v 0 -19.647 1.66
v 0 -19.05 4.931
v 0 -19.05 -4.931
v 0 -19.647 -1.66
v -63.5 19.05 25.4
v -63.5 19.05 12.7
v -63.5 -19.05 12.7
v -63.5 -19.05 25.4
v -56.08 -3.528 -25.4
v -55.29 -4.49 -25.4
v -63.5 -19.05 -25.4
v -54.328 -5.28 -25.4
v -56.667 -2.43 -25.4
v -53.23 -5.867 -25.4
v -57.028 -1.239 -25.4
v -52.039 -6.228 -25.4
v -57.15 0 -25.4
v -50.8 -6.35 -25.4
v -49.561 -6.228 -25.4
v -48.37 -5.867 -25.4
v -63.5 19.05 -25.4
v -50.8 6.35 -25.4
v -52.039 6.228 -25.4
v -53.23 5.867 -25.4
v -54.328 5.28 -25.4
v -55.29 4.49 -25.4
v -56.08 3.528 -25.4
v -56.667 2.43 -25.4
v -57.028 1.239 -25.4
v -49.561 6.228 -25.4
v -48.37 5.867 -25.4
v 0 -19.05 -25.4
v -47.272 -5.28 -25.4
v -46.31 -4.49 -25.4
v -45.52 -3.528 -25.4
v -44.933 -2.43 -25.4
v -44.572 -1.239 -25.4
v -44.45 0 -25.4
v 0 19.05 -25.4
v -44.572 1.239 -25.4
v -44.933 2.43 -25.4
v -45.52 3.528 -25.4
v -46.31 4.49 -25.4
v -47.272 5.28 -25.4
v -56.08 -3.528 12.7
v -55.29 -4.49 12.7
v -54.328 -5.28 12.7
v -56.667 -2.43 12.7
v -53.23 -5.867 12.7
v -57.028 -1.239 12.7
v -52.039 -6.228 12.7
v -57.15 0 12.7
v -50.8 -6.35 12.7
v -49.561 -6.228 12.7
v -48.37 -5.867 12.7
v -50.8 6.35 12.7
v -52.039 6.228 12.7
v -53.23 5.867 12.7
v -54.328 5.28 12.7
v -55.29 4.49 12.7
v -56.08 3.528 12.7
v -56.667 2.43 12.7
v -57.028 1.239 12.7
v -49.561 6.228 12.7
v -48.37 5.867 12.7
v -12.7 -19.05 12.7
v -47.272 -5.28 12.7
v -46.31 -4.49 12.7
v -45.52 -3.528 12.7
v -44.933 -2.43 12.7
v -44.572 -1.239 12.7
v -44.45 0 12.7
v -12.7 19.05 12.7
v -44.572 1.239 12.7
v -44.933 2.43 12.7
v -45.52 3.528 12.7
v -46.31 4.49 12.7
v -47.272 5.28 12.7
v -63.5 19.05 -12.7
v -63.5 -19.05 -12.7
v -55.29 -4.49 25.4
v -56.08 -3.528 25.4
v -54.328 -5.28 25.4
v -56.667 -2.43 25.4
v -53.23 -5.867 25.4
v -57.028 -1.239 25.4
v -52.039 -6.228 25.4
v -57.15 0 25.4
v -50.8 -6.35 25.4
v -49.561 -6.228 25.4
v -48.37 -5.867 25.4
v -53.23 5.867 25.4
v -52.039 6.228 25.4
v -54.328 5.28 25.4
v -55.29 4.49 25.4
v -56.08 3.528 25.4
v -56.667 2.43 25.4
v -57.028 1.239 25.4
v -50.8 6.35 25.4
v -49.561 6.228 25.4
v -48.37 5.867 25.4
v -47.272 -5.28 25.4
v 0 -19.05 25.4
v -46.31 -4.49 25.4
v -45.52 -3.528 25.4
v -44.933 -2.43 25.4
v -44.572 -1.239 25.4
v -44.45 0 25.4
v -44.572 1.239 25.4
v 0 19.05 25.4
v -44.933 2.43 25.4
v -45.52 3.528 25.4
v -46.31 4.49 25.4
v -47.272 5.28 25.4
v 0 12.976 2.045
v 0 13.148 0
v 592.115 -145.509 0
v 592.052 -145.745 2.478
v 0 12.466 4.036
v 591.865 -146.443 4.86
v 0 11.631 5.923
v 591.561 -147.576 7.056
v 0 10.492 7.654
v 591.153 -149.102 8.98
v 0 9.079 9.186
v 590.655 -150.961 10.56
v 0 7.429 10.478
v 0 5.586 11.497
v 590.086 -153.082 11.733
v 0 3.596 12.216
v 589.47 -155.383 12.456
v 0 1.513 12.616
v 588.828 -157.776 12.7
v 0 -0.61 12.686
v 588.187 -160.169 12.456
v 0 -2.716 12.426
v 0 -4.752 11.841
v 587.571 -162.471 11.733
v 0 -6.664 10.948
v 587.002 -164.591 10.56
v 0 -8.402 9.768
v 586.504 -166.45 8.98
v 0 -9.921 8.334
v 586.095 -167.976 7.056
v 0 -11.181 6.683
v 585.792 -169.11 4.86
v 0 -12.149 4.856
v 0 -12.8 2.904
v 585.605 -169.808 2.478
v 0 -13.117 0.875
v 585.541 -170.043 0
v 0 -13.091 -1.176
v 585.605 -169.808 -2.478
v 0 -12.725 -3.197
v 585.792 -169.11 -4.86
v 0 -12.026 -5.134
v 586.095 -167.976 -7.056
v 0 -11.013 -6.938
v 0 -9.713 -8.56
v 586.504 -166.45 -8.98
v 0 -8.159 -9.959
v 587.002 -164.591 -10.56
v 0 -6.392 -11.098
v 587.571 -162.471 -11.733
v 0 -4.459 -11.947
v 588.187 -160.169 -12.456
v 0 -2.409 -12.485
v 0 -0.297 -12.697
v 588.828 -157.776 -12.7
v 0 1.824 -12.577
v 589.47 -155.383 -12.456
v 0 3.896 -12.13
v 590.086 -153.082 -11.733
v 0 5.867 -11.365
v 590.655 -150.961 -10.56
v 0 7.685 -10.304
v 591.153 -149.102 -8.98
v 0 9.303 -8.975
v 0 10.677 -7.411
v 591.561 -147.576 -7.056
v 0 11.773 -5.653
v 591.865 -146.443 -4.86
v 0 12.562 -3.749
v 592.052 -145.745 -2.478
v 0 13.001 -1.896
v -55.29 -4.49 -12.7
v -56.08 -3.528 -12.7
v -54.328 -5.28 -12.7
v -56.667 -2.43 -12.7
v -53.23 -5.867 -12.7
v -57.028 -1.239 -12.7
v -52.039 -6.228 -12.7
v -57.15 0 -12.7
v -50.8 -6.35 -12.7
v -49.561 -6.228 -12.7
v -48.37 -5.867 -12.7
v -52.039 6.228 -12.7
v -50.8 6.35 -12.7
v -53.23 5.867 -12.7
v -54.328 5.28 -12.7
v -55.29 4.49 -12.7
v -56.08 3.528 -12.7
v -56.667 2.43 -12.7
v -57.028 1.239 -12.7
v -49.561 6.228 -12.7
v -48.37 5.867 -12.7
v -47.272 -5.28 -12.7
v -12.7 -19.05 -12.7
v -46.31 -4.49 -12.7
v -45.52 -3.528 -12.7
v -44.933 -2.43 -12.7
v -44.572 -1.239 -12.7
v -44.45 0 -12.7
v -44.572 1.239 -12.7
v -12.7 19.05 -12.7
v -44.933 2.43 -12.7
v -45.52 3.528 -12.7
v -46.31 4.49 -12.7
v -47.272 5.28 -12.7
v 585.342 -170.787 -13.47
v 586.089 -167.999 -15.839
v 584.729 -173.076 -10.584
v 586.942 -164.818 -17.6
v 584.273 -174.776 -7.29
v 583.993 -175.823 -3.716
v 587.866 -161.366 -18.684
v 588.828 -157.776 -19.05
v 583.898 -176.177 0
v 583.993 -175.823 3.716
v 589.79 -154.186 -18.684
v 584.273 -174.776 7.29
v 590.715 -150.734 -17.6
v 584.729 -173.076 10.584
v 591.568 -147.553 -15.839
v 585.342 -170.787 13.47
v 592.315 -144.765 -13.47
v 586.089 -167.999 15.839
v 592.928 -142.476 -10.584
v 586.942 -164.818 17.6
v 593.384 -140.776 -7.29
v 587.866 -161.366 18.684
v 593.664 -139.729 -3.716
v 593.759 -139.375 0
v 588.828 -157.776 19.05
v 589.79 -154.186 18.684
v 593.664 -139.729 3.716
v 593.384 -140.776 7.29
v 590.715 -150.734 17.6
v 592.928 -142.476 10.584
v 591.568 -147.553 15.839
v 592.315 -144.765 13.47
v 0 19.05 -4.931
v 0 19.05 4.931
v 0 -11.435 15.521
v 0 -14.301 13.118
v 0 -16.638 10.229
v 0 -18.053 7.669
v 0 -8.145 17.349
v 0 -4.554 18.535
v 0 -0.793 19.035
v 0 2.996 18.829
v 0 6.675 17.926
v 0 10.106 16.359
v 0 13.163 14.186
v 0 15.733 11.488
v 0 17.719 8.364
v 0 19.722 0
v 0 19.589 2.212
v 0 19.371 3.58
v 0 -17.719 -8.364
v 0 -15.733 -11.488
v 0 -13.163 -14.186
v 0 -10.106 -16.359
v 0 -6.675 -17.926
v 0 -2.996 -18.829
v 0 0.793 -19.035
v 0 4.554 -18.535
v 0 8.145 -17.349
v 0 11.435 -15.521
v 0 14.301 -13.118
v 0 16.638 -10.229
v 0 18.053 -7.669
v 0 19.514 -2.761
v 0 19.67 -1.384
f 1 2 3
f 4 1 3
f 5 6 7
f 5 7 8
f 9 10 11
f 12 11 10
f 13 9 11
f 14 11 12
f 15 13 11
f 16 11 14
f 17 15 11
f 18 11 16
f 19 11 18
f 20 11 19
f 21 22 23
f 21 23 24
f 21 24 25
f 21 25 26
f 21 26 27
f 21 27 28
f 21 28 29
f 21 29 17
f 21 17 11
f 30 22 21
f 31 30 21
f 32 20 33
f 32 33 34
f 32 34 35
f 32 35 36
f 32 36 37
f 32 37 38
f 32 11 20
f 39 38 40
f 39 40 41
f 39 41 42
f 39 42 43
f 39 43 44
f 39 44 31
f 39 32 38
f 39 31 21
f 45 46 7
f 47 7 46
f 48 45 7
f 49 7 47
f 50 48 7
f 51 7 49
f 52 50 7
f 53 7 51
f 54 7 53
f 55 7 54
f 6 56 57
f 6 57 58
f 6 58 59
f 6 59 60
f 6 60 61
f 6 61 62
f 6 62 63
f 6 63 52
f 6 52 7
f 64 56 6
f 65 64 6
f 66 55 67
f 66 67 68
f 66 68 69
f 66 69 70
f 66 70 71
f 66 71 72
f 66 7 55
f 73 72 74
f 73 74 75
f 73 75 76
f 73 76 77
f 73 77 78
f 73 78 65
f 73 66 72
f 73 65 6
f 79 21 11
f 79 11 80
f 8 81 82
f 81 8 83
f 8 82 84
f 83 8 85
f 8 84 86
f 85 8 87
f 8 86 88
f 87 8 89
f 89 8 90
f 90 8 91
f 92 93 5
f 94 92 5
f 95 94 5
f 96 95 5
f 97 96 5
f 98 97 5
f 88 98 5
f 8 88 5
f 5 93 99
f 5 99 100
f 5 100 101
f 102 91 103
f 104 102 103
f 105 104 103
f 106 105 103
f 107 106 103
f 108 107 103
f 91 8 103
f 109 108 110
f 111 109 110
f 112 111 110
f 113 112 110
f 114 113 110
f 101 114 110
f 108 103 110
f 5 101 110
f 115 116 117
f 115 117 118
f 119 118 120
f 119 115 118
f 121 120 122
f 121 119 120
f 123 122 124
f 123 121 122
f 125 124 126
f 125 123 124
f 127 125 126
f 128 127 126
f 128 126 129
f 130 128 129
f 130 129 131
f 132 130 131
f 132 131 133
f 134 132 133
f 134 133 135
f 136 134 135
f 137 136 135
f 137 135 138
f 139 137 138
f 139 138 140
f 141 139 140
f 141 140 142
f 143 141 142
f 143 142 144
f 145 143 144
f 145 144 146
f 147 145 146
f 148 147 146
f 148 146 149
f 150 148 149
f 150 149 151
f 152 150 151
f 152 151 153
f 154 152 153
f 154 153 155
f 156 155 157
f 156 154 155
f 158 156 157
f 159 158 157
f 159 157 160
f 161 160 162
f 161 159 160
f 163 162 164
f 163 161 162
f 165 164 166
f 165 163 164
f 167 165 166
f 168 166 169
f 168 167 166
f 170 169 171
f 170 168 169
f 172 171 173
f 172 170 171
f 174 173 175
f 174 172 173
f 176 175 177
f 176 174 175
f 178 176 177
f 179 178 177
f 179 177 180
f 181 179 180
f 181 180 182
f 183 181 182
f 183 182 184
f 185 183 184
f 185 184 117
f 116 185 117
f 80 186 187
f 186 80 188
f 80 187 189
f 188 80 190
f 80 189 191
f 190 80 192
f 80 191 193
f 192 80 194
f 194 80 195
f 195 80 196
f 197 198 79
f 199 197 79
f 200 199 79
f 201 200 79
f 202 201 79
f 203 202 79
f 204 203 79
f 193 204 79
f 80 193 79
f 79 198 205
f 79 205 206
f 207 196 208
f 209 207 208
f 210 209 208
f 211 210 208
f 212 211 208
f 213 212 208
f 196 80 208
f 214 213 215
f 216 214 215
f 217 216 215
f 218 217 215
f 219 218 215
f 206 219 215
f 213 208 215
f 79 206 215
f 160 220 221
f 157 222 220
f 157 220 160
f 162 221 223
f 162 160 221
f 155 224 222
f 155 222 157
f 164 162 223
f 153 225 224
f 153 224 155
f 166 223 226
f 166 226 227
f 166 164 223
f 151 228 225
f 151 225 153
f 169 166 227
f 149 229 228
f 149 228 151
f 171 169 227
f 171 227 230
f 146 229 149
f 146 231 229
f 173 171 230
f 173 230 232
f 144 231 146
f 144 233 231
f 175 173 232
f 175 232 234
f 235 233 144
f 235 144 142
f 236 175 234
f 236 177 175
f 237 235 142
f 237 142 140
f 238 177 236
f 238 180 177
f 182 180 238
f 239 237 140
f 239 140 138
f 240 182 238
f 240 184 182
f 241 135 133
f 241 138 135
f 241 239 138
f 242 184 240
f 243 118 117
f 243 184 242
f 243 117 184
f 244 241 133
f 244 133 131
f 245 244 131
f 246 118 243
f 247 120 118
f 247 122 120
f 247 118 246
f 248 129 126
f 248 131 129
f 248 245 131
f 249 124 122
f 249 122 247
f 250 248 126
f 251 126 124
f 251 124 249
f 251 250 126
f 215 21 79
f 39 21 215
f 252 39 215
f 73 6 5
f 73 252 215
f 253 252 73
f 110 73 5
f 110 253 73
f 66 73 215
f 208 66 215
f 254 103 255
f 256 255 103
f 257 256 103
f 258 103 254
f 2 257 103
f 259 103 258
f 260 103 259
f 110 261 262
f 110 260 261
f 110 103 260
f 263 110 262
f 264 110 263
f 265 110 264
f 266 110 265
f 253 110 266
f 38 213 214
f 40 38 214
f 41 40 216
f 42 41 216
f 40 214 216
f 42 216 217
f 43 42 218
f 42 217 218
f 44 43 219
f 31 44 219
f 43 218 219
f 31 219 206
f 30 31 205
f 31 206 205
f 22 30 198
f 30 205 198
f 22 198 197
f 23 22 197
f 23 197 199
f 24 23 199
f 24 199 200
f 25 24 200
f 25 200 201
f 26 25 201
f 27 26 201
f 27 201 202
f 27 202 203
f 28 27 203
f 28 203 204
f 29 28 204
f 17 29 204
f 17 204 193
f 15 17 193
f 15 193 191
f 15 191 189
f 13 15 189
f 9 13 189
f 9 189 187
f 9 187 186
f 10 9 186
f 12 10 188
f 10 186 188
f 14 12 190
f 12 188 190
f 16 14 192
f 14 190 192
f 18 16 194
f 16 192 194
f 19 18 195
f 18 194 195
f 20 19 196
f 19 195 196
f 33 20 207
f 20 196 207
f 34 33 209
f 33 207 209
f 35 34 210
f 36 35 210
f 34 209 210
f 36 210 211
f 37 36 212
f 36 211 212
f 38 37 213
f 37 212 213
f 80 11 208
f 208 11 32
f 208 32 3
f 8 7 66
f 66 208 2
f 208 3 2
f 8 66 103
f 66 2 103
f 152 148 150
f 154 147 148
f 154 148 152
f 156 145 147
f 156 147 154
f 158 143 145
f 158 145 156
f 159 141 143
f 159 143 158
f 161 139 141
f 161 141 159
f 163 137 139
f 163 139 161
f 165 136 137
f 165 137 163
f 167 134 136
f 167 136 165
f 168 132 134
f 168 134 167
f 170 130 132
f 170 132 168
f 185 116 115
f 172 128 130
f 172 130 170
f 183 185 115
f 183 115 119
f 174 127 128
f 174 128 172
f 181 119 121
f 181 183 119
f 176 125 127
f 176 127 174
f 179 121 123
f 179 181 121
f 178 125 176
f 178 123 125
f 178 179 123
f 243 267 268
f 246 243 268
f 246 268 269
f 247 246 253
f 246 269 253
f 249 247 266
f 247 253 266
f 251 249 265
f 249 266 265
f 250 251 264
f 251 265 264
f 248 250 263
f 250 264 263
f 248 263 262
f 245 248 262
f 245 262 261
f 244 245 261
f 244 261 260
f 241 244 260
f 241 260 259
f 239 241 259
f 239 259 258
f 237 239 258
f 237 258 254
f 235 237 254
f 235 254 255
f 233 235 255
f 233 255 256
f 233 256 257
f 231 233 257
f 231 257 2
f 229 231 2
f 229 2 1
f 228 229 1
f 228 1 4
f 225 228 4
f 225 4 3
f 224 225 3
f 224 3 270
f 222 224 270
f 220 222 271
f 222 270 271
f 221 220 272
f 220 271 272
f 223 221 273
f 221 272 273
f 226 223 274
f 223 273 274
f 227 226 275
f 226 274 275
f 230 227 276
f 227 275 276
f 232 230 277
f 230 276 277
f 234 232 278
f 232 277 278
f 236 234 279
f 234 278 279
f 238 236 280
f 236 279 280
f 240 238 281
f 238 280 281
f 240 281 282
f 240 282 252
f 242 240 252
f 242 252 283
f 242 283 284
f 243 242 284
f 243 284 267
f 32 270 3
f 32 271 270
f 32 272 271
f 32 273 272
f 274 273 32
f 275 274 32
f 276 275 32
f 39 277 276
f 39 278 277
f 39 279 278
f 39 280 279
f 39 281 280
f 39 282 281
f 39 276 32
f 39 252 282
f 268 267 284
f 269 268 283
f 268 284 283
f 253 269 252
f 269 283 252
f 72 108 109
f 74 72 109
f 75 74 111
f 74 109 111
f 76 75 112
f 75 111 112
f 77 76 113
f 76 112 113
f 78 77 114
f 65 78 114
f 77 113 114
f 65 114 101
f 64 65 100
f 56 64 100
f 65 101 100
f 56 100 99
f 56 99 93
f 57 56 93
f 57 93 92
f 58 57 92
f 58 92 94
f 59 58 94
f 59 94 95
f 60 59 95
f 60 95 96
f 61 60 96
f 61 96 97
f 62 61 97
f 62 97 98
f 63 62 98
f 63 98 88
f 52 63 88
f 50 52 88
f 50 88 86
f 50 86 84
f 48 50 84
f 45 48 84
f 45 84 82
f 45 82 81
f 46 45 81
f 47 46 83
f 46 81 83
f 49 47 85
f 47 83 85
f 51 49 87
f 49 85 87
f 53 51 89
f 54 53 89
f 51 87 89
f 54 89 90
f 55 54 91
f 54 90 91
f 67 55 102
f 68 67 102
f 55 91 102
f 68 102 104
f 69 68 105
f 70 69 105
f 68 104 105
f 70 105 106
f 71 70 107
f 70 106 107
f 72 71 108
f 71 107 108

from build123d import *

# Parameters (mm, degrees)
SWEEP1_START         = -25.4
SWEEP1_OUTLINE_R     = 19.05
SWEEP1_DEPTH         = 635
CUT_SWEEP1_START     = -25.4
CUT_SWEEP1_OUTLINE_R = 12.7
CUT_SWEEP1_DEPTH     = 635
SKETCH25_R           = 57.15
CUT_EXTRUDE1_DEPTH   = 620.637672354
SKETCH26_W           = 50.8
SKETCH26_H           = 38.1
BOSS_EXTRUDE1_DEPTH  = 12.7
SKETCH27_W           = 12.7
SKETCH27_H           = 38.1
BOSS_EXTRUDE2_DEPTH  = 50.8
SKETCH28_R           = 6.35
CUT_EXTRUDE2_DEPTH   = 622.424639437


# Read off the part's stored shape, not the designer's step: Sweep1, Cut-Sweep1
with BuildPart() as part:
    # Sweep1 outline → Sweep1 (new body)
    with BuildSketch(Plane(origin=(0, 0, 0), x_dir=(0.2588190451025211, 0.9659258262890682, 0), z_dir=(0.9659258262890682, -0.2588190451025211, 0)).offset(SWEEP1_START)):
        Circle(SWEEP1_OUTLINE_R)
    extrude(amount=SWEEP1_DEPTH)

    # Cut-Sweep1 outline → Cut-Sweep1 (cut)
    with BuildSketch(Plane(origin=(0, 0, 0), x_dir=(0.2588190451025211, 0.9659258262890682, 0), z_dir=(0.9659258262890682, -0.2588190451025211, 0)).offset(CUT_SWEEP1_START)):
        Circle(CUT_SWEEP1_OUTLINE_R)
    extrude(amount=CUT_SWEEP1_DEPTH, mode=Mode.SUBTRACT)

    # Sketch25 → Cut-Extrude1 (cut, through all)
    with BuildSketch(Plane(origin=(0, 0, 0), x_dir=(0, 0, -1), z_dir=(1, 0, 0))):
        Circle(SKETCH25_R)
    extrude(amount=-CUT_EXTRUDE1_DEPTH, mode=Mode.SUBTRACT)

    # Sketch26 → Boss-Extrude1 (add)
    with BuildSketch(Plane(origin=(0, 0, 0), x_dir=(0, 0, -1), z_dir=(1, 0, 0))):
        Rectangle(SKETCH26_W, SKETCH26_H)
    extrude(amount=-BOSS_EXTRUDE1_DEPTH)

    # Sketch27 → Boss-Extrude2 (add)
    with BuildSketch(Plane.ZY.offset(12.7)):
        with Locations((19.05, 0)):
            Rectangle(SKETCH27_W, SKETCH27_H)
        with Locations((-19.05, 0)):
            Rectangle(SKETCH27_W, SKETCH27_H)
    extrude(amount=BOSS_EXTRUDE2_DEPTH)

    # Sketch28 → Cut-Extrude2 (cut, through all)
    with BuildSketch(Plane.XY.offset(25.4)):
        with Locations((-50.8, 0)):
            Circle(SKETCH28_R)
    extrude(amount=-CUT_EXTRUDE2_DEPTH, mode=Mode.SUBTRACT)


solid = part.part
